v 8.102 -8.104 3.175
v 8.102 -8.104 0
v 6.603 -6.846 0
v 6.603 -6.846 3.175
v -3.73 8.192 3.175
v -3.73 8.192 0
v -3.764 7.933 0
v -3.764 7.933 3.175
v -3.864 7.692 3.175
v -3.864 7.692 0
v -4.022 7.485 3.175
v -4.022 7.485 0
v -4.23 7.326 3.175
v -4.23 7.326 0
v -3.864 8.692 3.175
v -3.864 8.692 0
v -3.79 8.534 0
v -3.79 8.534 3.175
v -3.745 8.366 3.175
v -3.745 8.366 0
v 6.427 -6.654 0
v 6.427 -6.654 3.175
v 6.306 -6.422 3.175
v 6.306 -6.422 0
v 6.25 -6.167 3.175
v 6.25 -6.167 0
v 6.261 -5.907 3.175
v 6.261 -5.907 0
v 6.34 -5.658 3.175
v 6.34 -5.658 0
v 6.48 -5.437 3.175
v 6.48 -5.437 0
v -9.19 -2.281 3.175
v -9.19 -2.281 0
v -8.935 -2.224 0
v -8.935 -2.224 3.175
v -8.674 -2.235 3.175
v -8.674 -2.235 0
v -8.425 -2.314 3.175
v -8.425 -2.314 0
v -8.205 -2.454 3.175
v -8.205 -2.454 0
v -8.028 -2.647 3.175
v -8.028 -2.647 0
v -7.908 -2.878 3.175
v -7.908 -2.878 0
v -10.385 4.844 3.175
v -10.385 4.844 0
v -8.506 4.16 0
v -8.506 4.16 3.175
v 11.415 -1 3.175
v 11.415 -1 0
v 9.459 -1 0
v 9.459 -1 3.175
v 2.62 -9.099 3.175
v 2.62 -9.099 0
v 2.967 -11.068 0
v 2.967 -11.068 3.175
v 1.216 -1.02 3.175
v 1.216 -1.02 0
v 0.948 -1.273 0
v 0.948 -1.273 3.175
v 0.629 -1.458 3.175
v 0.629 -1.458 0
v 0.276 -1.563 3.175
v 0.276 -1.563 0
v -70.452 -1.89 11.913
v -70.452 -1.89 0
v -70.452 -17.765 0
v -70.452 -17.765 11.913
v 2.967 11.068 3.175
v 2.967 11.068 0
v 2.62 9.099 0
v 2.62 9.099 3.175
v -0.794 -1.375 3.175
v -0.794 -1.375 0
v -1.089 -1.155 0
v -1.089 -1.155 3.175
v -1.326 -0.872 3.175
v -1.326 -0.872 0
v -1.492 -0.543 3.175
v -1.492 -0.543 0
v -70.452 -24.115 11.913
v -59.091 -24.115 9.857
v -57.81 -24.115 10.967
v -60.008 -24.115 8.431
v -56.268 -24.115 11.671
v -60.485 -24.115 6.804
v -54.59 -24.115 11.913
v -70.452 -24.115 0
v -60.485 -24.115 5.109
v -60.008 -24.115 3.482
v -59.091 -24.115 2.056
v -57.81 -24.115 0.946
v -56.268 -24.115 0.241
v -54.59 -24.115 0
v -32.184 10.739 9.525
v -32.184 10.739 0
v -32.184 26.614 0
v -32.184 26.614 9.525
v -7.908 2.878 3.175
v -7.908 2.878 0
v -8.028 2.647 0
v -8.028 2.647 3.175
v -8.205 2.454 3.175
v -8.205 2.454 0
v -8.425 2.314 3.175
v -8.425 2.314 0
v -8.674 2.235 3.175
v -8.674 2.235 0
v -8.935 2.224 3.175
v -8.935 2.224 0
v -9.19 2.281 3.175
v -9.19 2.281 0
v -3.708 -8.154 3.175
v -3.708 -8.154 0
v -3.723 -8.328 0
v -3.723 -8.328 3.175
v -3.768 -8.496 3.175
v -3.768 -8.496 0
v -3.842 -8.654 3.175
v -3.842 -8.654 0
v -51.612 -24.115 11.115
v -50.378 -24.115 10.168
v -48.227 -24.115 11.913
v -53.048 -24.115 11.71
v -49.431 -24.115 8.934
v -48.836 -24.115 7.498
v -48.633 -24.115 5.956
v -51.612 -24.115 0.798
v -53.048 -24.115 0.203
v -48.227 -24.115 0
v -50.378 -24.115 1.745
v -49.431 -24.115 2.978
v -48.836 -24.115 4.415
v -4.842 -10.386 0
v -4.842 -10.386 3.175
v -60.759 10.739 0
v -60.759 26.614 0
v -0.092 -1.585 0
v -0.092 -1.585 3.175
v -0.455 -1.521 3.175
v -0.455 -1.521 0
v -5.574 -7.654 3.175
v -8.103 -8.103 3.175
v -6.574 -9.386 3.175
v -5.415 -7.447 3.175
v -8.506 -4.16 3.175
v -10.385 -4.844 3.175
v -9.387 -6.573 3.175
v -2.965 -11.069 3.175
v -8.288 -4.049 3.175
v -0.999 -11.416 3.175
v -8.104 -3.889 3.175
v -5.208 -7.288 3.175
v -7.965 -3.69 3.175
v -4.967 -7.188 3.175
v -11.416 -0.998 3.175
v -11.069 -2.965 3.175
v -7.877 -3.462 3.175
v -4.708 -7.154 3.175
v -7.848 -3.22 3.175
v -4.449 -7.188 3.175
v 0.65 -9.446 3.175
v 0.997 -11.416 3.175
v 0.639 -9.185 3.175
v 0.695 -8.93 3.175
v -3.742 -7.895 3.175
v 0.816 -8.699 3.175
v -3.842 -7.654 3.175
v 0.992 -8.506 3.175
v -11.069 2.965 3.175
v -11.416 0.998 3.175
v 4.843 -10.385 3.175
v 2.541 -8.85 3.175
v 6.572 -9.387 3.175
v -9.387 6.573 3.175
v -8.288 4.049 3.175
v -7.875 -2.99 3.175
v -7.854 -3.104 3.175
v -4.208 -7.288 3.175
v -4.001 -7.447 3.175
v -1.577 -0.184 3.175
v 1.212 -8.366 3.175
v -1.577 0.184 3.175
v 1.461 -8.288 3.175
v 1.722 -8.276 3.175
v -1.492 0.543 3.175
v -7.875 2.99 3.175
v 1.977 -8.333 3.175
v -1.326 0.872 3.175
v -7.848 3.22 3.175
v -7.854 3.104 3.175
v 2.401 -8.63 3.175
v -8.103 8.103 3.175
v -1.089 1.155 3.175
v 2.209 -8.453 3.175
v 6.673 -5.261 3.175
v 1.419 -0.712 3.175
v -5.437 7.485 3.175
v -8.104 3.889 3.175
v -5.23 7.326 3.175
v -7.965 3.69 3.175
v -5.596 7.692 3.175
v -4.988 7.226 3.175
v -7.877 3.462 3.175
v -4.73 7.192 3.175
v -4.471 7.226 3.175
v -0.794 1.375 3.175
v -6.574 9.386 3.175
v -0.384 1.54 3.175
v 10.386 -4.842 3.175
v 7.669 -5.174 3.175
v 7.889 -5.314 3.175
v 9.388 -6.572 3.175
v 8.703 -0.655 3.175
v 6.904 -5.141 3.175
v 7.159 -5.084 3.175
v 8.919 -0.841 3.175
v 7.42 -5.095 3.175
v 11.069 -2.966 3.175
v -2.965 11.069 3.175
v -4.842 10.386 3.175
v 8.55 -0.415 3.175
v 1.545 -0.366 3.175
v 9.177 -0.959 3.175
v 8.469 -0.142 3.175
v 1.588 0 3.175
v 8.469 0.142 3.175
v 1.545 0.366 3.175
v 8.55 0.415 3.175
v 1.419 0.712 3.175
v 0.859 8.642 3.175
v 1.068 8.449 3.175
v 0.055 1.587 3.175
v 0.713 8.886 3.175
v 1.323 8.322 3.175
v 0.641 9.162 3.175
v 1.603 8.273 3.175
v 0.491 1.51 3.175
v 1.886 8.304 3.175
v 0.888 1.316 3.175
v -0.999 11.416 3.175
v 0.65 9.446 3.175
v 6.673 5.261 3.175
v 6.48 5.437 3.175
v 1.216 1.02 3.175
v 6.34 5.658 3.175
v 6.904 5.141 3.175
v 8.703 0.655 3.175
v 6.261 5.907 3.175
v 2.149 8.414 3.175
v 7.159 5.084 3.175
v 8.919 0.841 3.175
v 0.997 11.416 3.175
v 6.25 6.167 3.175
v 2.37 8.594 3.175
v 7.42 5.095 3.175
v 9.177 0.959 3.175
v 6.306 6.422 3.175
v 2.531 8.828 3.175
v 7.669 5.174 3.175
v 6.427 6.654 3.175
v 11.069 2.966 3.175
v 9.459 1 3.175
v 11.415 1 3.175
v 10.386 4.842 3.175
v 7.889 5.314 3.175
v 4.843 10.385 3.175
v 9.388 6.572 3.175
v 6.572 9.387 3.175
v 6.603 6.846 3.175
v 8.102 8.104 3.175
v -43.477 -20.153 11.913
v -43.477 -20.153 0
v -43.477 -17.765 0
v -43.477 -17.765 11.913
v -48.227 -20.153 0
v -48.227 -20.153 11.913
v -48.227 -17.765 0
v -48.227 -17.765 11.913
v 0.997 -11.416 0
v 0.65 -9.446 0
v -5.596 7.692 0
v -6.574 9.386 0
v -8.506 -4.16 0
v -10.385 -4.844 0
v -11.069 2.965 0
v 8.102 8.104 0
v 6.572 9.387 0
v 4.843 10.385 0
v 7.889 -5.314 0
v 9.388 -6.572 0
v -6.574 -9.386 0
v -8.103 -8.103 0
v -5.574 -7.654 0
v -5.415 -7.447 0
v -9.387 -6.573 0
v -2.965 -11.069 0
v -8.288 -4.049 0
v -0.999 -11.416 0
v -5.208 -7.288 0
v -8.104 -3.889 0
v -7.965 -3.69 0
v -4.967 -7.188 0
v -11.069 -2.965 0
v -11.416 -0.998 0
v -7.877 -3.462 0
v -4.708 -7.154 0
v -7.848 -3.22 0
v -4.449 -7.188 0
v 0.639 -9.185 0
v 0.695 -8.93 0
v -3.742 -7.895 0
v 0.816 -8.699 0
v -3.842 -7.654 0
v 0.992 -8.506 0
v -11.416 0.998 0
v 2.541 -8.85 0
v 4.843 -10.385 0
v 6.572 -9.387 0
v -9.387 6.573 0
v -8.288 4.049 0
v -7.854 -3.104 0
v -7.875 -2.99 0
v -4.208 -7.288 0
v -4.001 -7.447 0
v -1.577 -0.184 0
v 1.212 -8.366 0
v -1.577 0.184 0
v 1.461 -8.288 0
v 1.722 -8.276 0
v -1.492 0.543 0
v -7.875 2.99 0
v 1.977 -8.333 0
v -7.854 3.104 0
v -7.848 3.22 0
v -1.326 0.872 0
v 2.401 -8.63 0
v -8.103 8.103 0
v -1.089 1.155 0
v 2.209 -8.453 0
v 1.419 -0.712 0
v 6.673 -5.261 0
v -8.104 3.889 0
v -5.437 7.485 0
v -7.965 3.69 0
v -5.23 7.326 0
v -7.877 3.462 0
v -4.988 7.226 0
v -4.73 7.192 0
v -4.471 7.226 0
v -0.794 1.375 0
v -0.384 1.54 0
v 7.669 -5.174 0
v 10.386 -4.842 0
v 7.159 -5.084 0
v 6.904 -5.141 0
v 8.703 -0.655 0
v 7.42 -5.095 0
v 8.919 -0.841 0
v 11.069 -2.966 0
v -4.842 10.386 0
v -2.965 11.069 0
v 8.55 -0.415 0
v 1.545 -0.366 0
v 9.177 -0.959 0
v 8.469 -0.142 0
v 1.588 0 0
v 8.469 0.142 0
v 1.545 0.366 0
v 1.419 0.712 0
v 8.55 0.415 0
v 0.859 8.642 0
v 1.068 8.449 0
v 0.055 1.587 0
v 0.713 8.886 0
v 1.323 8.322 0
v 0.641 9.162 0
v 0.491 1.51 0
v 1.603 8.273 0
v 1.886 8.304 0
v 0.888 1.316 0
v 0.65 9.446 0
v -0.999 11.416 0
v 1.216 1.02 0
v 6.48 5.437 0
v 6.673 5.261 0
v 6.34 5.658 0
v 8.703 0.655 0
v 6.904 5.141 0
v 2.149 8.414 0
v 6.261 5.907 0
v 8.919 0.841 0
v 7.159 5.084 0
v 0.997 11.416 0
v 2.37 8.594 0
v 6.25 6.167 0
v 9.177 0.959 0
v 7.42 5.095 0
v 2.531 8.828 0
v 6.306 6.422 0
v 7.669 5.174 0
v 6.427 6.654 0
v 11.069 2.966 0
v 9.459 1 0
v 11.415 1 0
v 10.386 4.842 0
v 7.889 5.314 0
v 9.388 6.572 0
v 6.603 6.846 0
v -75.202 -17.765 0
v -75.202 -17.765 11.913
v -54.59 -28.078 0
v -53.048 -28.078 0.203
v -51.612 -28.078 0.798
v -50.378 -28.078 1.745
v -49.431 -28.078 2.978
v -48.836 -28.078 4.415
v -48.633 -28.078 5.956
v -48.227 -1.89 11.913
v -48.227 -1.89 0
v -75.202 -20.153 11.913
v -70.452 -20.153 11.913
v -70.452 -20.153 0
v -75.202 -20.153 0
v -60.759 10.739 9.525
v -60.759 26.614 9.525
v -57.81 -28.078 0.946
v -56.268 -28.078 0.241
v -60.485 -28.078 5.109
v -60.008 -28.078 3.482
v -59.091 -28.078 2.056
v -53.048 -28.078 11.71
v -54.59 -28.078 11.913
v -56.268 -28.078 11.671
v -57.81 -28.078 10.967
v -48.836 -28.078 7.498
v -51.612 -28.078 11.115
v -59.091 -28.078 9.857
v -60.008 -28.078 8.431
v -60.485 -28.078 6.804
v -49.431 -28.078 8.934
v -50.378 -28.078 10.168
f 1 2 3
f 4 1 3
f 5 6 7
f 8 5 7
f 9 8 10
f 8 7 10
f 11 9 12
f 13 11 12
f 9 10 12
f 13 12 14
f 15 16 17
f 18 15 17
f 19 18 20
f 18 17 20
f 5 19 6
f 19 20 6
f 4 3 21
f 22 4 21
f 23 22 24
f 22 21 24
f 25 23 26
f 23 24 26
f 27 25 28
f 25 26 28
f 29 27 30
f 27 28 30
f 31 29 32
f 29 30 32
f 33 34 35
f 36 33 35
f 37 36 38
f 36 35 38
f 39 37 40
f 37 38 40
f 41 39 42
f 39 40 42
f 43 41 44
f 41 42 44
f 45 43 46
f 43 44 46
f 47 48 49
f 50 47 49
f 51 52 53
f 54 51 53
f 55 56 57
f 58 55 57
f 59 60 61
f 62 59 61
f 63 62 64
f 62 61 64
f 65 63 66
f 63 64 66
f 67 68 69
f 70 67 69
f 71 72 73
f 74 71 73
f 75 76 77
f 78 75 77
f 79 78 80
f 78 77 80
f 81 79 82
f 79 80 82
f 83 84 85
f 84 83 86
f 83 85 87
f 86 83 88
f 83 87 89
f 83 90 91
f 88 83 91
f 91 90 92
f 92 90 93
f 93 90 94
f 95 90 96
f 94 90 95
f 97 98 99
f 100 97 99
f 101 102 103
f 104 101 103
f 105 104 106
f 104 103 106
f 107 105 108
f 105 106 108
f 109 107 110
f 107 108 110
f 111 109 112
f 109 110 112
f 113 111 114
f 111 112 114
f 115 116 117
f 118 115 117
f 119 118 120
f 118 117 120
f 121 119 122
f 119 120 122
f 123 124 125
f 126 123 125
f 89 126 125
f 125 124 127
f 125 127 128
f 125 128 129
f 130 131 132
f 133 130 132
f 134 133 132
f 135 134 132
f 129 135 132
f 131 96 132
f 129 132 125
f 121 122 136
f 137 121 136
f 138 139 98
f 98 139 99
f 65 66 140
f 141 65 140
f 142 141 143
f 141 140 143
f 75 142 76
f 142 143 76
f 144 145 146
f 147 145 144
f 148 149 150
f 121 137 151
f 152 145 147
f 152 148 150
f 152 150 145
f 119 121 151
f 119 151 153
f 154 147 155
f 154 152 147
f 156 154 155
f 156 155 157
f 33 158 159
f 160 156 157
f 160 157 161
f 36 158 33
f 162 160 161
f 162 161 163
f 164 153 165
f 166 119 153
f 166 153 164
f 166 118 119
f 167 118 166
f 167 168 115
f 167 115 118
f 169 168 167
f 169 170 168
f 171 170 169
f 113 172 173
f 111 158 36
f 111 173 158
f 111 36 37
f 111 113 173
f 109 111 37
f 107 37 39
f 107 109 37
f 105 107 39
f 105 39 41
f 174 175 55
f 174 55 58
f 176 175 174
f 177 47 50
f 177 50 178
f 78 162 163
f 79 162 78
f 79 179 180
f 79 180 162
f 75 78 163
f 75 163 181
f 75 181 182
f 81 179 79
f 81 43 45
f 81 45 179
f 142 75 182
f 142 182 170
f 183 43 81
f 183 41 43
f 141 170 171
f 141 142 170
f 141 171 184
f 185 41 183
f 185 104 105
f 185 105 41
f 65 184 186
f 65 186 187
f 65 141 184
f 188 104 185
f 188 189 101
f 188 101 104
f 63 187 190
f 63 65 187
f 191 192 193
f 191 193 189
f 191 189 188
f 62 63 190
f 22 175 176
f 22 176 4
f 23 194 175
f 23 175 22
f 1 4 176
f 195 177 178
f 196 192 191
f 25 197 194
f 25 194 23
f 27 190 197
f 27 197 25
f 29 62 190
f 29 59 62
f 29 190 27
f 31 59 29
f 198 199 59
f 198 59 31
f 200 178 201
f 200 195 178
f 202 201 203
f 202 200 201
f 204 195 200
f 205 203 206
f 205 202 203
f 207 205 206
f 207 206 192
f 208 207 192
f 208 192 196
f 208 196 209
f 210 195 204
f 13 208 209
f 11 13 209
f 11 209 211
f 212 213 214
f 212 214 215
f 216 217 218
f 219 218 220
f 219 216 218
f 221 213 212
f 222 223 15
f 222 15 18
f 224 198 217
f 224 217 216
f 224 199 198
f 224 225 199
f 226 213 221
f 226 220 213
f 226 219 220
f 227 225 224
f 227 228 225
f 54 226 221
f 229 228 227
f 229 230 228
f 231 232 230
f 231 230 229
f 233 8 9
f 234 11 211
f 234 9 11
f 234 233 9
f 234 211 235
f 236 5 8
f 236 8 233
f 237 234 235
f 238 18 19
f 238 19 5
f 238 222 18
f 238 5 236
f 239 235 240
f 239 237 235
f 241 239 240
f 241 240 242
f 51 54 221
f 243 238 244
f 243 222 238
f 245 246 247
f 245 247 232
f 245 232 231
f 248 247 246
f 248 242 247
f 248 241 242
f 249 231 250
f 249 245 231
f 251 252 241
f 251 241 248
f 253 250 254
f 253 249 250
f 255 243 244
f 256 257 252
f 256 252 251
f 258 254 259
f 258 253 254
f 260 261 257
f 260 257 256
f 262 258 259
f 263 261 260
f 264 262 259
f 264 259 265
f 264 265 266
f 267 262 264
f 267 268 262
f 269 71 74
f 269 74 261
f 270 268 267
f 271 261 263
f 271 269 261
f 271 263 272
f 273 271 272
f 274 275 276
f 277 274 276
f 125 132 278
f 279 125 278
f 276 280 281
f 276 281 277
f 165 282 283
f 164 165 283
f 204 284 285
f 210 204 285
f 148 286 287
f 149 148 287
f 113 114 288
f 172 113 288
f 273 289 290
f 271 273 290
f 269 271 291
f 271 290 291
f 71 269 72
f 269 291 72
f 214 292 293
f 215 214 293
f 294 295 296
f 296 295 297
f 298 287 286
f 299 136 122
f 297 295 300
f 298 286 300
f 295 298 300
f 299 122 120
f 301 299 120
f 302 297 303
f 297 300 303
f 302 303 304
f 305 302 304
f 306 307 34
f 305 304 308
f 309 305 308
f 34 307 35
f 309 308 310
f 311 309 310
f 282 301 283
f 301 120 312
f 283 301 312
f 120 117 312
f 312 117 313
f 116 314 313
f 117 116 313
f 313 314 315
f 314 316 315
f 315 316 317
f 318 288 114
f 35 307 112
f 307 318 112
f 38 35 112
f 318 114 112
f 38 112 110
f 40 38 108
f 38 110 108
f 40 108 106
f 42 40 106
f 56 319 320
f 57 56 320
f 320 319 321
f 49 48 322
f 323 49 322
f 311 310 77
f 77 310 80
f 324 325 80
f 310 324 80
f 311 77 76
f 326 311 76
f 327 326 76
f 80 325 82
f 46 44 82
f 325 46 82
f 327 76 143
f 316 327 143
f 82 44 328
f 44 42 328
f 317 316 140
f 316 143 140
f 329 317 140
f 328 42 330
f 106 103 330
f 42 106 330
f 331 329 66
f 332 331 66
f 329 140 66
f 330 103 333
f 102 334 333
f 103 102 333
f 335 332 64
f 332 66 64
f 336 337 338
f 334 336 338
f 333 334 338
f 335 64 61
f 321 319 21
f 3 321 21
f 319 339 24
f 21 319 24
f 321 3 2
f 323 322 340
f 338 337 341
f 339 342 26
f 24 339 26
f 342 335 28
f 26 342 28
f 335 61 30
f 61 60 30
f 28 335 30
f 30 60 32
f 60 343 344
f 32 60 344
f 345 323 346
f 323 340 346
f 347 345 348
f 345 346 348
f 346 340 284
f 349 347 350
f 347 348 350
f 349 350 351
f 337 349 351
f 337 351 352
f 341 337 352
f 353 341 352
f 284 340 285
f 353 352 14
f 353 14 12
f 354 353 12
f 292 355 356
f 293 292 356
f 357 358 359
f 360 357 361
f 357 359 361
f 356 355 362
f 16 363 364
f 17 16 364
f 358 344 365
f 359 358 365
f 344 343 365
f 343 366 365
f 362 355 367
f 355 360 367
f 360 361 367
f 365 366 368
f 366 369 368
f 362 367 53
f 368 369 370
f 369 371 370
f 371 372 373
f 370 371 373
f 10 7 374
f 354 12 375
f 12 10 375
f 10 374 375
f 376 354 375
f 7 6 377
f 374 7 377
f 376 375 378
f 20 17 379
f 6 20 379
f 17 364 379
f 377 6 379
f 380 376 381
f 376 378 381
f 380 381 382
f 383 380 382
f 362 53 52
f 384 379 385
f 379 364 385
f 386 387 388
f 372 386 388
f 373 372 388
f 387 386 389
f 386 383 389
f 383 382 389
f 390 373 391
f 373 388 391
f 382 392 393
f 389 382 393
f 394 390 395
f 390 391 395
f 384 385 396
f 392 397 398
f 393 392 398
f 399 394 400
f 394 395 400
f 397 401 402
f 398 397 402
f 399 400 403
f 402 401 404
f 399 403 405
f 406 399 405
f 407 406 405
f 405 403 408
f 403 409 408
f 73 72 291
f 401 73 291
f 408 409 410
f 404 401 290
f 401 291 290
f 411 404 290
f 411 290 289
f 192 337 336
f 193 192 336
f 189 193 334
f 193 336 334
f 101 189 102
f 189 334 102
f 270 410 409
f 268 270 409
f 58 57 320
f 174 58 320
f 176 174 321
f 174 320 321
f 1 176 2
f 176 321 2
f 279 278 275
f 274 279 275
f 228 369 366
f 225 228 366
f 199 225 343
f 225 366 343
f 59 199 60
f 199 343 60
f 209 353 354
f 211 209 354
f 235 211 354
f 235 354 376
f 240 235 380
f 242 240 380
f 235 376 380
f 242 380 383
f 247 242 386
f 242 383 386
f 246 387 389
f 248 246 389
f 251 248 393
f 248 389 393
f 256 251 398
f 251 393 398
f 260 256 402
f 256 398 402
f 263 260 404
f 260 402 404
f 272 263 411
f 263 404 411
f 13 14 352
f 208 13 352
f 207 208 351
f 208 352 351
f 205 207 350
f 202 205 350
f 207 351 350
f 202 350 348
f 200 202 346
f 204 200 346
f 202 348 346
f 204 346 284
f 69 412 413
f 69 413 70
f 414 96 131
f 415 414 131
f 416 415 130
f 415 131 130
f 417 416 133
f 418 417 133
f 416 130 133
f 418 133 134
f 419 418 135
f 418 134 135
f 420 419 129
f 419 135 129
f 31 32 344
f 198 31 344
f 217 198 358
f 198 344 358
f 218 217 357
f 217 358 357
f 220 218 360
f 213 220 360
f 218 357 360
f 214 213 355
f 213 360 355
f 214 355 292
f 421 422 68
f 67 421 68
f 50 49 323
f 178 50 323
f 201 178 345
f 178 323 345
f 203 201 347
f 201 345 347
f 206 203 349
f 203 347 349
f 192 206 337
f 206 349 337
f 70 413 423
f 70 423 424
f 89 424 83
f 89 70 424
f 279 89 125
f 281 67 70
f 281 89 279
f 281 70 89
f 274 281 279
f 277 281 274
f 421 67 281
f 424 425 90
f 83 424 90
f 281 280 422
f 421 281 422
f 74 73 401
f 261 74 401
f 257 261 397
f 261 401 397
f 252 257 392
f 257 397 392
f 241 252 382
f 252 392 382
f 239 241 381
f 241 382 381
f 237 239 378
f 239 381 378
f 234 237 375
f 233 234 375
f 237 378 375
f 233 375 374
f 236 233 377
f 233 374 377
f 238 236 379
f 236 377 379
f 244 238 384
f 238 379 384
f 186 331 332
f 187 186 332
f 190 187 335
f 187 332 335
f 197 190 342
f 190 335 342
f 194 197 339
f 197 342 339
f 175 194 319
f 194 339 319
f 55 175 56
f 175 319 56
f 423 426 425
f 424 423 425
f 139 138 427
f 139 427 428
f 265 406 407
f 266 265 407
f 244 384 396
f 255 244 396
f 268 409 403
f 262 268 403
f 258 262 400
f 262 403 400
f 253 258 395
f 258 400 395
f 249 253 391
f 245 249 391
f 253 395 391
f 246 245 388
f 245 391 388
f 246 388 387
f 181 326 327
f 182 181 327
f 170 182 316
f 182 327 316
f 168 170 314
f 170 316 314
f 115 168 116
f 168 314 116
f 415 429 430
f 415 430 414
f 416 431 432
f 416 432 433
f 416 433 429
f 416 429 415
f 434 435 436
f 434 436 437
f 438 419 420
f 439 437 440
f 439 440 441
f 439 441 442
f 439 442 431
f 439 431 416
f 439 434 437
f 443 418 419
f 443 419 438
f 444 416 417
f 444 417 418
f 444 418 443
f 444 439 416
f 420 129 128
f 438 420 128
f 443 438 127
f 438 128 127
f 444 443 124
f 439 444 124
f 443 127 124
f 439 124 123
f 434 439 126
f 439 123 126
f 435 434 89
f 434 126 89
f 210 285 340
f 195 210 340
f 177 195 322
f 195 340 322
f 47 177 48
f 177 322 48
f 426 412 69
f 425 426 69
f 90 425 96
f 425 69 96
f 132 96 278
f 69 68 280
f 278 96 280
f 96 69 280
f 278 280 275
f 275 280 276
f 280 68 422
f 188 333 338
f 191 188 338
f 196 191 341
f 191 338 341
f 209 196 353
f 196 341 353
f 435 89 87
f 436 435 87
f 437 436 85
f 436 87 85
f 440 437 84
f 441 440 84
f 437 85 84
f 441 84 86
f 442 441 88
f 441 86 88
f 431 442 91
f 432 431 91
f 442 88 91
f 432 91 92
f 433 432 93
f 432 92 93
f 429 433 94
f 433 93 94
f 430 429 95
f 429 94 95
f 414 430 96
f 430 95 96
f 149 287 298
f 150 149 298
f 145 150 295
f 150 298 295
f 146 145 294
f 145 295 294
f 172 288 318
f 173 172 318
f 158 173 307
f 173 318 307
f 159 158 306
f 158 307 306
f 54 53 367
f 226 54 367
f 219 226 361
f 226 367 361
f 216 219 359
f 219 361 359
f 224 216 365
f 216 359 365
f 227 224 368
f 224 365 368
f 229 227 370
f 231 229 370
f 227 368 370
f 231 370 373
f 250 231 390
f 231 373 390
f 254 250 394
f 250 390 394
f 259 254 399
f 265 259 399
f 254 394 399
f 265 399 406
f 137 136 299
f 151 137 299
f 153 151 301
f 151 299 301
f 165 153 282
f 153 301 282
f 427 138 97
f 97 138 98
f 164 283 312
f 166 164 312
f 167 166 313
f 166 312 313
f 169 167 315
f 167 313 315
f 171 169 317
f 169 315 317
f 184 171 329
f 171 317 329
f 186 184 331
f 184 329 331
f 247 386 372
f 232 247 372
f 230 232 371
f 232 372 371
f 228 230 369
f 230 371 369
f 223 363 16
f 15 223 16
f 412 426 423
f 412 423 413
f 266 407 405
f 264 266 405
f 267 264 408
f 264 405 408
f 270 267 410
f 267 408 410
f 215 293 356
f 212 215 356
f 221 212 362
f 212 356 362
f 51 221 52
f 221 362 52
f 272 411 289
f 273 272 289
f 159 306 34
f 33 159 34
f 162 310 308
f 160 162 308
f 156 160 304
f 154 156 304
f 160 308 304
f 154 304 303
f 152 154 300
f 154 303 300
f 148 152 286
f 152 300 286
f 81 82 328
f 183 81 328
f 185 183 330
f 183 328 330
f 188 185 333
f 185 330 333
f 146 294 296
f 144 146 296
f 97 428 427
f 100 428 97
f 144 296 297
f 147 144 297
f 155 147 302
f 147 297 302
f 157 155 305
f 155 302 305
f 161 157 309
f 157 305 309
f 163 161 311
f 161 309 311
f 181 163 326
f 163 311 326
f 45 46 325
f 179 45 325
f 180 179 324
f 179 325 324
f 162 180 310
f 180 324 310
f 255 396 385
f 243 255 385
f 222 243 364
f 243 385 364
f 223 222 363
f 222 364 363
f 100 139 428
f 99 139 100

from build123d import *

# Parameters (mm, degrees)
F1_DEPTH = 3.175
F2_W     = 4.7498
F2_H     = 2.3876
F3_DEPTH = 11.9126
F5_DEPTH = 3.9624
F6_W     = 28.575
F6_H     = 15.875
F7_DEPTH = 9.525


with BuildPart() as f1:
    # F0 (on Top) → F1 (new body)
    with BuildSketch(Plane.XY):
        with BuildLine():
            Line((6.603346, 6.846273), (8.101946, 8.103747))
            ThreePointArc((8.101946, 8.103747), (5.729578, 9.92392), (2.967078, 11.068365))
            Line((2.967078, 11.068365), (2.619782, 9.098749))
            ThreePointArc((2.619782, 9.098749), (1.461326, 8.28759), (0.650166, 9.446046))
            Line((0.650166, 9.446046), (0.997462, 11.415661))
            ThreePointArc((0.997462, 11.415661), (-1.989862, 11.285066), (-4.841694, 10.38606))
            Line((-4.841694, 10.38606), (-3.863553, 8.691869))
            ThreePointArc((-3.863553, 8.691869), (-3.763652, 8.450688), (-3.729578, 8.191869))
            ThreePointArc((-3.729578, 8.191869), (-3.863553, 7.691869), (-4.229578, 7.325844))
            Line((-4.229578, 7.325844), (-0.79375, 1.374815))
            ThreePointArc((-0.79375, 1.374815), (0.275666, 1.563382), (1.216096, 1.020425))
            Line((1.216096, 1.020425), (6.480089, 5.437441))
            ThreePointArc((6.480089, 5.437441), (6.249939, 6.167384), (6.603346, 6.846273))
        make_face()
        with BuildLine():
            Line((9.459156, 1), (11.415439, 1))
            ThreePointArc((11.415439, 1), (10.768084, 3.919262), (9.387521, 6.571658))
            Line((9.387521, 6.571658), (7.888921, 5.314184))
            ThreePointArc((7.888921, 5.314184), (7.158978, 5.084034), (6.480089, 5.437441))
            Line((6.480089, 5.437441), (1.216096, 1.020425))
            ThreePointArc((1.216096, 1.020425), (1.491762, 0.542957), (1.5875, 0))
            ThreePointArc((1.5875, 0), (1.491762, -0.542957), (1.216096, -1.020425))
            Line((1.216096, -1.020425), (6.480089, -5.437441))
            ThreePointArc((6.480089, -5.437441), (7.158978, -5.084034), (7.888921, -5.314184))
            Line((7.888921, -5.314184), (9.387521, -6.571658))
            ThreePointArc((9.387521, -6.571658), (10.768084, -3.919262), (11.415439, -1))
            Line((11.415439, -1), (9.459156, -1))
            ThreePointArc((9.459156, -1), (8.459156, 0), (9.459156, 1))
        make_face()
        with BuildLine():
            ThreePointArc((2.967078, -11.068365), (5.729578, -9.92392), (8.101946, -8.103747))
            Line((8.101946, -8.103747), (6.603346, -6.846273))
            ThreePointArc((6.603346, -6.846273), (6.249939, -6.167384), (6.480089, -5.437441))
            Line((6.480089, -5.437441), (1.216096, -1.020425))
            ThreePointArc((1.216096, -1.020425), (0.79375, -1.374815), (0.275666, -1.563382))
            Line((0.275666, -1.563382), (1.461326, -8.28759))
            ThreePointArc((1.461326, -8.28759), (2.20855, -8.453246), (2.619782, -9.098749))
            Line((2.619782, -9.098749), (2.967078, -11.068365))
        make_face()
        with BuildLine():
            Line((1.461326, -8.28759), (0.275666, -1.563382))
            ThreePointArc((0.275666, -1.563382), (-0.275666, -1.563382), (-0.79375, -1.374815))
            Line((-0.79375, -1.374815), (-4.20772, -7.287984))
            ThreePointArc((-4.20772, -7.287984), (-3.841694, -7.65401), (-3.70772, -8.15401))
            ThreePointArc((-3.70772, -8.15401), (-3.741794, -8.412829), (-3.841694, -8.65401))
            Line((-3.841694, -8.65401), (-4.841694, -10.38606))
            ThreePointArc((-4.841694, -10.38606), (-1.989862, -11.285066), (0.997462, -11.415661))
            Line((0.997462, -11.415661), (0.650166, -9.446046))
            ThreePointArc((0.650166, -9.446046), (0.815822, -8.698821), (1.461326, -8.28759))
        make_face()
        with BuildLine():
            ThreePointArc((-0.79375, -1.374815), (-1.216096, -1.020425), (-1.491762, -0.542957))
            Line((-1.491762, -0.542957), (-7.907926, -2.87825))
            ThreePointArc((-7.907926, -2.87825), (-7.862811, -3.046622), (-7.847619, -3.22027))
            ThreePointArc((-7.847619, -3.22027), (-8.028467, -3.793846), (-8.505599, -4.159963))
            Line((-8.505599, -4.159963), (-10.384984, -4.844003))
            ThreePointArc((-10.384984, -4.844003), (-8.778223, -7.365803), (-6.573745, -9.38606))
            Line((-6.573745, -9.38606), (-5.573745, -7.65401))
            ThreePointArc((-5.573745, -7.65401), (-4.966539, -7.188084), (-4.20772, -7.287984))
            Line((-4.20772, -7.287984), (-0.79375, -1.374815))
        make_face()
        with BuildLine():
            Line((-7.907926, -2.87825), (-1.491762, -0.542957))
            ThreePointArc((-1.491762, -0.542957), (-1.5875, 0), (-1.491762, 0.542957))
            Line((-1.491762, 0.542957), (-7.907926, 2.87825))
            ThreePointArc((-7.907926, 2.87825), (-8.425001, 2.313962), (-9.189639, 2.280577))
            Line((-9.189639, 2.280577), (-11.069024, 2.964618))
            ThreePointArc((-11.069024, 2.964618), (-11.459156, 0), (-11.069024, -2.964618))
            Line((-11.069024, -2.964618), (-9.189639, -2.280577))
            ThreePointArc((-9.189639, -2.280577), (-8.425001, -2.313962), (-7.907926, -2.87825))
        make_face()
        with BuildLine():
            ThreePointArc((-1.491762, 0.542957), (-1.216096, 1.020425), (-0.79375, 1.374815))
            Line((-0.79375, 1.374815), (-4.229578, 7.325844))
            ThreePointArc((-4.229578, 7.325844), (-4.988397, 7.225943), (-5.595603, 7.691869))
            Line((-5.595603, 7.691869), (-6.573745, 9.38606))
            ThreePointArc((-6.573745, 9.38606), (-8.778223, 7.365803), (-10.384984, 4.844003))
            Line((-10.384984, 4.844003), (-8.505599, 4.159963))
            ThreePointArc((-8.505599, 4.159963), (-8.028467, 3.793846), (-7.847619, 3.22027))
            ThreePointArc((-7.847619, 3.22027), (-7.862811, 3.046622), (-7.907926, 2.87825))
            Line((-7.907926, 2.87825), (-1.491762, 0.542957))
        make_face()
    extrude(amount=F1_DEPTH)


with BuildPart() as f3:
    # F2 (on Top) → F3 (new body)
    with BuildSketch(Plane.XY):
        Polygon((-48.227002, -1.890479), (-70.452002, -1.890479), (-70.452002, -17.765479), (-70.452002, -20.153079), (-70.452002, -24.115479), (-48.227002, -24.115479), (-48.227002, -20.153079), (-48.227002, -17.765479), align=None)
        with Locations((-72.826902, -18.959279)):
            Rectangle(F2_W, F2_H)
        with Locations((-45.852102, -18.959279)):
            Rectangle(F2_W, F2_H)
    extrude(amount=F3_DEPTH)

    # F4 (on face) → F5 (join)
    with BuildSketch(Plane.XZ.offset(24.115479)):
        with BuildLine():
            ThreePointArc((-54.589702, 0), (-50.377962, 1.74456), (-48.633402, 5.9563))
            ThreePointArc((-48.633402, 5.9563), (-50.377962, 10.16804), (-54.589702, 11.9126))
            ThreePointArc((-54.589702, 11.9126), (-60.546002, 5.9563), (-54.589702, 0))
        make_face()
    extrude(amount=F5_DEPTH)


with BuildPart() as f7:
    # F6 (on Top) → F7 (new body)
    with BuildSketch(Plane.XY):
        with Locations((-46.471974, 18.676497)):
            Rectangle(F6_W, F6_H)
    extrude(amount=F7_DEPTH)


solid = Compound([f1.part, f3.part, f7.part])
